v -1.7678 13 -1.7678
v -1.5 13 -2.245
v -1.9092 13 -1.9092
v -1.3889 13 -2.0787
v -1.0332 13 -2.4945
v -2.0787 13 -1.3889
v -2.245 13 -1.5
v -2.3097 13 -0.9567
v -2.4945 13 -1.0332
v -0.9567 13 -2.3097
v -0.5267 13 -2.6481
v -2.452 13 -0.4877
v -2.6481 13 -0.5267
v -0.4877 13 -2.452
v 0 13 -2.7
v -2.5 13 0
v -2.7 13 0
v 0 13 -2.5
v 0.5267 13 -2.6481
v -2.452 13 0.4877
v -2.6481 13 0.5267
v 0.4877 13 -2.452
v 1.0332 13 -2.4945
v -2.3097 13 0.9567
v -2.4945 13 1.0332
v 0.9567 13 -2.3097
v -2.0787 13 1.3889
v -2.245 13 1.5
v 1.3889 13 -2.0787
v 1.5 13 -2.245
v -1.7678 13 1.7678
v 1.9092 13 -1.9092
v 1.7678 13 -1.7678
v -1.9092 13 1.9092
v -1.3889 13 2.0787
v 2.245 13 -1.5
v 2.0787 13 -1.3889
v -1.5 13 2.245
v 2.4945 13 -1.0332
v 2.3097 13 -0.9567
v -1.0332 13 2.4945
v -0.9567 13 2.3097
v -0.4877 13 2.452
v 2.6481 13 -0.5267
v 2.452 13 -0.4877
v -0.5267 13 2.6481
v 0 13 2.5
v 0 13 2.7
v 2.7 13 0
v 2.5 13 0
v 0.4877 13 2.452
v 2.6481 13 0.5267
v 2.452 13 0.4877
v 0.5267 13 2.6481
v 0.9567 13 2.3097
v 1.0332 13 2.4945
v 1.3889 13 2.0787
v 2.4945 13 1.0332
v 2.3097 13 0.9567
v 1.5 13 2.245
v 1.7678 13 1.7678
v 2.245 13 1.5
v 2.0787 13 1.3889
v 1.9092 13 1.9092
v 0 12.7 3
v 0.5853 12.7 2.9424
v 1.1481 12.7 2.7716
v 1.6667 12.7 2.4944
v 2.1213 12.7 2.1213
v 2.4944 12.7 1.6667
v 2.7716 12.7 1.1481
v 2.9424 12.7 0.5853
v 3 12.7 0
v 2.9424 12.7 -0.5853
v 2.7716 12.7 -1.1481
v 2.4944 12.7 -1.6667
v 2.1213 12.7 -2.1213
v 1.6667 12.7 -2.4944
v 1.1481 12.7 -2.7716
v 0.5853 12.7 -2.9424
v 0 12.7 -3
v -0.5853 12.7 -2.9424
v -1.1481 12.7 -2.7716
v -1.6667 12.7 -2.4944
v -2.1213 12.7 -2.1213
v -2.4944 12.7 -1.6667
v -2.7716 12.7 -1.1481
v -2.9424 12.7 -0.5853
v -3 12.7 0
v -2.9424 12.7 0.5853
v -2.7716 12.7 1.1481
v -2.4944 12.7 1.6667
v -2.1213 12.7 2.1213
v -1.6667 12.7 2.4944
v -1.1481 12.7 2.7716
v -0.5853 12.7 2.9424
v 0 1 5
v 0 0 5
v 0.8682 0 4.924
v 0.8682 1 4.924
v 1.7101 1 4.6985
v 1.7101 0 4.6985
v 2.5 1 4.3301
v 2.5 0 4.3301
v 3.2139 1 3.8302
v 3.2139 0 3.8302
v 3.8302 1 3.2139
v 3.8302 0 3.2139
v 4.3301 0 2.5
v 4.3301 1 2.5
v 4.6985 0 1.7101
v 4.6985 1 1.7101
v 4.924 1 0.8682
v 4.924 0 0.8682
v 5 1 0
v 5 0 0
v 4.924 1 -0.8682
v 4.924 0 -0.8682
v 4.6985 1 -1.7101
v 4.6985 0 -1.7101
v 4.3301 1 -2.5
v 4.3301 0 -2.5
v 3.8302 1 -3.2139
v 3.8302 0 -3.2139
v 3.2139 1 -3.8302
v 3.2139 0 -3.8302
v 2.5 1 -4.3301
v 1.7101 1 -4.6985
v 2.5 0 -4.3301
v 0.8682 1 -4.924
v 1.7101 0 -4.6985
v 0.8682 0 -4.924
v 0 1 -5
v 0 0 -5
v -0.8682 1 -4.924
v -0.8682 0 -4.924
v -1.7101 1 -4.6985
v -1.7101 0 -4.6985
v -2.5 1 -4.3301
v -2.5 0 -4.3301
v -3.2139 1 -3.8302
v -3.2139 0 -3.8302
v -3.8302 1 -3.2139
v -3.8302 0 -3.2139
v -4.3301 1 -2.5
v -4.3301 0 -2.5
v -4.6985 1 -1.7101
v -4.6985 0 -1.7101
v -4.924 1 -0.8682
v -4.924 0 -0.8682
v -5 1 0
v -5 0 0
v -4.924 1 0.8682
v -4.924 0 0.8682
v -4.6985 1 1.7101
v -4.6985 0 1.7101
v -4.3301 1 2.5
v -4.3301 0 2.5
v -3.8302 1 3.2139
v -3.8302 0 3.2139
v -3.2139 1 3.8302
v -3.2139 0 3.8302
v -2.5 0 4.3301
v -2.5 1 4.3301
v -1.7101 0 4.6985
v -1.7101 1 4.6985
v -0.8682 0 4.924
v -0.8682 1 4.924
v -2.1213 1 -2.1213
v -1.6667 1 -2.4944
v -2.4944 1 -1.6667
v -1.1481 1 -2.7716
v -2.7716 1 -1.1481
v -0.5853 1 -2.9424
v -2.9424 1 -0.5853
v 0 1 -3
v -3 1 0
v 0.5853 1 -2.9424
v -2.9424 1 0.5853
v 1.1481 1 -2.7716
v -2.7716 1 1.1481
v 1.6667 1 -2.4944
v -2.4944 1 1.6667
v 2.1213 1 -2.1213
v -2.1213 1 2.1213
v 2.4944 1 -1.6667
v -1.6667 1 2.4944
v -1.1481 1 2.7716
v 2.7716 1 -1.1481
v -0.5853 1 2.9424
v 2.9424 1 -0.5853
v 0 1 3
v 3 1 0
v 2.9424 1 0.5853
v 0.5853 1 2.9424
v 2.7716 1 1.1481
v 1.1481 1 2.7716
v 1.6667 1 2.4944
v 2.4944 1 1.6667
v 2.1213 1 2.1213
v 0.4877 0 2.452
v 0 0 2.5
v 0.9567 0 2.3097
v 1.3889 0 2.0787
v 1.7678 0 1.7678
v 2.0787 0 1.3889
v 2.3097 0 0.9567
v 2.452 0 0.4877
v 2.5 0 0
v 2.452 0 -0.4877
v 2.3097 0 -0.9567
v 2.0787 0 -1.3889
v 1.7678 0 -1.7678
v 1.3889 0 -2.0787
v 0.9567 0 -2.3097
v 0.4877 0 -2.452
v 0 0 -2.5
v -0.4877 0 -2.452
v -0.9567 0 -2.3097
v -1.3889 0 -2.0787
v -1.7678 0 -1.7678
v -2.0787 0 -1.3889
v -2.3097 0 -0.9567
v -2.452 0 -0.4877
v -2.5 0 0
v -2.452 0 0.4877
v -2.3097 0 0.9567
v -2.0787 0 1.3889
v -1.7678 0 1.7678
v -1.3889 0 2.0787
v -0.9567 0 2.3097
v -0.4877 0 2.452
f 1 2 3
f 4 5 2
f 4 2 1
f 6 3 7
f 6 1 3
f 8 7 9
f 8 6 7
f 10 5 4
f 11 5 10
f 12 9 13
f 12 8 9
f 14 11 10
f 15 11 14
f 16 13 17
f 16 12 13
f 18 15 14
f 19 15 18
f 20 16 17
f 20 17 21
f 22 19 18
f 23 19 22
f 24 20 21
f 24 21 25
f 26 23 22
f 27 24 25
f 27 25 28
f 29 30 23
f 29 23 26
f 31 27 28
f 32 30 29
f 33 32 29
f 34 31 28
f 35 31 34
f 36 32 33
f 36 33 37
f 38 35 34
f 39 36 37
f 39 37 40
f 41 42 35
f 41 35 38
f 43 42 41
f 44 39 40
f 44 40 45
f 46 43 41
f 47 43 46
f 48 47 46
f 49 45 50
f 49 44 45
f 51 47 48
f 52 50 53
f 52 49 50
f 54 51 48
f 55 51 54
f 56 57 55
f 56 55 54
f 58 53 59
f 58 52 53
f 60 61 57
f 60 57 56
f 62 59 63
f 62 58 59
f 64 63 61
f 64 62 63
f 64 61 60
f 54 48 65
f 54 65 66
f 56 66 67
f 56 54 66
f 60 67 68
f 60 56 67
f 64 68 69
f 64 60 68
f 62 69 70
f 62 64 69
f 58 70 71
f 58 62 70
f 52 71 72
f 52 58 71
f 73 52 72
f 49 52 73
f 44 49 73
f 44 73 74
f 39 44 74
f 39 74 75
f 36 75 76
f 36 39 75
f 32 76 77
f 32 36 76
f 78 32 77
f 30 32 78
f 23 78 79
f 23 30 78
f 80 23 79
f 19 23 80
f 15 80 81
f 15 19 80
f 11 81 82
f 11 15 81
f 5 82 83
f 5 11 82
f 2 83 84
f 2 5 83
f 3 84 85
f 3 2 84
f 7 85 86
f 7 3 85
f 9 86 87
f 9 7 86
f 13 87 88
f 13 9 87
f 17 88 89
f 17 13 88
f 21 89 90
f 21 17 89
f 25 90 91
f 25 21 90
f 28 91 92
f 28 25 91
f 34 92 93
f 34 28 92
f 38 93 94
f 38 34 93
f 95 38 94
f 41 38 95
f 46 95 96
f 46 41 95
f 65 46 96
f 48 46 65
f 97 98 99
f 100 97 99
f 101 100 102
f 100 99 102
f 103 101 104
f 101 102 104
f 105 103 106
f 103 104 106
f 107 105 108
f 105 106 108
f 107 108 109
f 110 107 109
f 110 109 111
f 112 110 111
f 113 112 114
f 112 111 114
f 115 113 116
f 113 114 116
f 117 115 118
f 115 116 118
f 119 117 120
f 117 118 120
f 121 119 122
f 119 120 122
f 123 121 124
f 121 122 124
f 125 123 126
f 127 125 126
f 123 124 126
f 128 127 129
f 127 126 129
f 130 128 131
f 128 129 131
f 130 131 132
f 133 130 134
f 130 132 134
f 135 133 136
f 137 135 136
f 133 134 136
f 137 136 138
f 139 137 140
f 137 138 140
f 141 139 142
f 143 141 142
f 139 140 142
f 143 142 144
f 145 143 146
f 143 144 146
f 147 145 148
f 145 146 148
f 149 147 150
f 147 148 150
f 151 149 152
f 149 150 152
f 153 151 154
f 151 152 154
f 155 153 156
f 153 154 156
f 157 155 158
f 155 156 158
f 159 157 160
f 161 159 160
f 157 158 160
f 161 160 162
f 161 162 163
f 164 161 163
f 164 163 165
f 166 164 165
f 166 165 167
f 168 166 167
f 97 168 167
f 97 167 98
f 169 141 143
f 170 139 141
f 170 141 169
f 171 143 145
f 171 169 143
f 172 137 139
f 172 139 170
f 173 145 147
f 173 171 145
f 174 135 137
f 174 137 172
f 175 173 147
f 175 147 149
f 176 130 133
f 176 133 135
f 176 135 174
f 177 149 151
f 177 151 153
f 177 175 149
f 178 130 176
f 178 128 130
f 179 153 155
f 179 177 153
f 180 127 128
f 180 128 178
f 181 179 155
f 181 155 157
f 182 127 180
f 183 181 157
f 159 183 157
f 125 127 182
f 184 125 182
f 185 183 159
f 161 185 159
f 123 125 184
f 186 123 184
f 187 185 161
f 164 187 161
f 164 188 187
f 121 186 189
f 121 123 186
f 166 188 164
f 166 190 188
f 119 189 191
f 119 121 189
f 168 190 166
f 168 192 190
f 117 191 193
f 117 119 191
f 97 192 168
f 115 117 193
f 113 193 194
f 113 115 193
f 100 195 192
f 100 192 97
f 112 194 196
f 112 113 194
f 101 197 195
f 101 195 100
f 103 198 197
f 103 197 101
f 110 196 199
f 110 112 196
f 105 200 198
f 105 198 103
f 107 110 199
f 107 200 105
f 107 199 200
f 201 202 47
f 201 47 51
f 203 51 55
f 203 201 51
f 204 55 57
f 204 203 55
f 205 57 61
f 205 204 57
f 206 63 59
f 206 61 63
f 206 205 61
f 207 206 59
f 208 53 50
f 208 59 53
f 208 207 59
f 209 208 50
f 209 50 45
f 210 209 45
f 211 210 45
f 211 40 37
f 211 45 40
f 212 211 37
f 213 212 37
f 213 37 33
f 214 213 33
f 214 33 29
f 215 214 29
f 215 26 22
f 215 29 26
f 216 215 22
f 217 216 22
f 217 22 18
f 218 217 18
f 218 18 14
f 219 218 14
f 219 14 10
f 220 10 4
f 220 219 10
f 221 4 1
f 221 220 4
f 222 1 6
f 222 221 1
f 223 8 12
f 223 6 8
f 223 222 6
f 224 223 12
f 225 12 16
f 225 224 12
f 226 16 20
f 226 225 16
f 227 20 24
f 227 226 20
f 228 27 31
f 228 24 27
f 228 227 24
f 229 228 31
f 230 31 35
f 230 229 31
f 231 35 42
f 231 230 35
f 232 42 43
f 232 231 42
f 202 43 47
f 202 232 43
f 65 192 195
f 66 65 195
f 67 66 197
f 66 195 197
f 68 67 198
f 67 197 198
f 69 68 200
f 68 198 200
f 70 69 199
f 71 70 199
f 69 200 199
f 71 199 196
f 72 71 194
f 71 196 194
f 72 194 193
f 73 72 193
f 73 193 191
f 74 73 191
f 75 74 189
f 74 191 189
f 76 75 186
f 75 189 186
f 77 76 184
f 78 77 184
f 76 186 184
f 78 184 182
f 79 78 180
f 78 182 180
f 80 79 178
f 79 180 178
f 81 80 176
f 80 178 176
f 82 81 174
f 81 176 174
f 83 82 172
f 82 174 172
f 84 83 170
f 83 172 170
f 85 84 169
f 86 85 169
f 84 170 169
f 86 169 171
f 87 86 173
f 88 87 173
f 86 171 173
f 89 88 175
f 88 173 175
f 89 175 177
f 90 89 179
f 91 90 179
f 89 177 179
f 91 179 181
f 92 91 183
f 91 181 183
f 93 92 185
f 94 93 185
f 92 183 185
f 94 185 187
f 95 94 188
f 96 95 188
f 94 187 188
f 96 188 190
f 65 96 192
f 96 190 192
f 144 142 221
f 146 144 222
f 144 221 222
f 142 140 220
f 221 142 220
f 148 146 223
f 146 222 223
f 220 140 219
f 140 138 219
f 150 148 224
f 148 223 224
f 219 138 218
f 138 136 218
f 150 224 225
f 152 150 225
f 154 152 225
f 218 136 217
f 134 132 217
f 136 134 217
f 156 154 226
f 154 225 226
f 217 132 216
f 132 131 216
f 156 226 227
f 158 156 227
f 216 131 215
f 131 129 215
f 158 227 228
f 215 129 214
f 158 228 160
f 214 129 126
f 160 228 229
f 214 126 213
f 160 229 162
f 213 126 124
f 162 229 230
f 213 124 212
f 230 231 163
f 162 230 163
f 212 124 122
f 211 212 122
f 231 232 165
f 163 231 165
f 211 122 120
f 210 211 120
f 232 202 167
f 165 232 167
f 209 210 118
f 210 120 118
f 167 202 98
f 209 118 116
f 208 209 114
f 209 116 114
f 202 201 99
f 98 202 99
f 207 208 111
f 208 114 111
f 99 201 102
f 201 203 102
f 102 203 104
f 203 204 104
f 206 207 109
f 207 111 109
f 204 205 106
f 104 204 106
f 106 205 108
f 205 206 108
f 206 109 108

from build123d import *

# Parameters (mm, degrees)
SKETCH1_R               = 5
BOSS_EXTRUDE1_DEPTH     = 1
SKETCH2_R               = 3
BOSS_EXTRUDE2_DEPTH     = 12
CHAMFER1_SIZE           = 0.3
CUT_EXTRUDE1_DEPTH      = 15.798648587
CUT_EXTRUDE1_DEPTH_BACK = 15.798648587
SKETCH3_R               = 2.5


with BuildPart() as part:
    # Sketch1 → Boss-Extrude1 (new body)
    with BuildSketch(Plane(origin=(0, 0, 0), x_dir=(1, 0, 0), z_dir=(0, 1, 0))):
        with Locations(Location((0, 0, 0), (0, 0, 270))):
            Circle(SKETCH1_R)
    extrude(amount=BOSS_EXTRUDE1_DEPTH)

    # Sketch2 → Boss-Extrude2 (add)
    with BuildSketch(Plane(origin=(0, 1, 0), x_dir=(1, 0, 0), z_dir=(0, 1, 0))):
        with Locations(Location((0, 0, 0), (0, 0, 270))):
            Circle(SKETCH2_R)
    extrude(amount=BOSS_EXTRUDE2_DEPTH)

    # Chamfer1
    chamfer1_edges = [part.edges().sort_by_distance(p)[0] for p in [
        (0, 13, -3),
    ]]
    chamfer(chamfer1_edges, length=CHAMFER1_SIZE)

    # Sketch3 → Cut-Extrude1 (cut, two sides: drawn at the far end of the back side and taken through both)
    with BuildSketch(Plane(origin=(0, 13, 0), x_dir=(1, 0, 0), z_dir=(0, 1, 0)).offset(-CUT_EXTRUDE1_DEPTH_BACK)):
        with Locations(Location((0, 0, 0), (0, 0, 270))):
            Circle(SKETCH3_R)
    extrude(amount=CUT_EXTRUDE1_DEPTH + CUT_EXTRUDE1_DEPTH_BACK, mode=Mode.SUBTRACT)


solid = part.part
